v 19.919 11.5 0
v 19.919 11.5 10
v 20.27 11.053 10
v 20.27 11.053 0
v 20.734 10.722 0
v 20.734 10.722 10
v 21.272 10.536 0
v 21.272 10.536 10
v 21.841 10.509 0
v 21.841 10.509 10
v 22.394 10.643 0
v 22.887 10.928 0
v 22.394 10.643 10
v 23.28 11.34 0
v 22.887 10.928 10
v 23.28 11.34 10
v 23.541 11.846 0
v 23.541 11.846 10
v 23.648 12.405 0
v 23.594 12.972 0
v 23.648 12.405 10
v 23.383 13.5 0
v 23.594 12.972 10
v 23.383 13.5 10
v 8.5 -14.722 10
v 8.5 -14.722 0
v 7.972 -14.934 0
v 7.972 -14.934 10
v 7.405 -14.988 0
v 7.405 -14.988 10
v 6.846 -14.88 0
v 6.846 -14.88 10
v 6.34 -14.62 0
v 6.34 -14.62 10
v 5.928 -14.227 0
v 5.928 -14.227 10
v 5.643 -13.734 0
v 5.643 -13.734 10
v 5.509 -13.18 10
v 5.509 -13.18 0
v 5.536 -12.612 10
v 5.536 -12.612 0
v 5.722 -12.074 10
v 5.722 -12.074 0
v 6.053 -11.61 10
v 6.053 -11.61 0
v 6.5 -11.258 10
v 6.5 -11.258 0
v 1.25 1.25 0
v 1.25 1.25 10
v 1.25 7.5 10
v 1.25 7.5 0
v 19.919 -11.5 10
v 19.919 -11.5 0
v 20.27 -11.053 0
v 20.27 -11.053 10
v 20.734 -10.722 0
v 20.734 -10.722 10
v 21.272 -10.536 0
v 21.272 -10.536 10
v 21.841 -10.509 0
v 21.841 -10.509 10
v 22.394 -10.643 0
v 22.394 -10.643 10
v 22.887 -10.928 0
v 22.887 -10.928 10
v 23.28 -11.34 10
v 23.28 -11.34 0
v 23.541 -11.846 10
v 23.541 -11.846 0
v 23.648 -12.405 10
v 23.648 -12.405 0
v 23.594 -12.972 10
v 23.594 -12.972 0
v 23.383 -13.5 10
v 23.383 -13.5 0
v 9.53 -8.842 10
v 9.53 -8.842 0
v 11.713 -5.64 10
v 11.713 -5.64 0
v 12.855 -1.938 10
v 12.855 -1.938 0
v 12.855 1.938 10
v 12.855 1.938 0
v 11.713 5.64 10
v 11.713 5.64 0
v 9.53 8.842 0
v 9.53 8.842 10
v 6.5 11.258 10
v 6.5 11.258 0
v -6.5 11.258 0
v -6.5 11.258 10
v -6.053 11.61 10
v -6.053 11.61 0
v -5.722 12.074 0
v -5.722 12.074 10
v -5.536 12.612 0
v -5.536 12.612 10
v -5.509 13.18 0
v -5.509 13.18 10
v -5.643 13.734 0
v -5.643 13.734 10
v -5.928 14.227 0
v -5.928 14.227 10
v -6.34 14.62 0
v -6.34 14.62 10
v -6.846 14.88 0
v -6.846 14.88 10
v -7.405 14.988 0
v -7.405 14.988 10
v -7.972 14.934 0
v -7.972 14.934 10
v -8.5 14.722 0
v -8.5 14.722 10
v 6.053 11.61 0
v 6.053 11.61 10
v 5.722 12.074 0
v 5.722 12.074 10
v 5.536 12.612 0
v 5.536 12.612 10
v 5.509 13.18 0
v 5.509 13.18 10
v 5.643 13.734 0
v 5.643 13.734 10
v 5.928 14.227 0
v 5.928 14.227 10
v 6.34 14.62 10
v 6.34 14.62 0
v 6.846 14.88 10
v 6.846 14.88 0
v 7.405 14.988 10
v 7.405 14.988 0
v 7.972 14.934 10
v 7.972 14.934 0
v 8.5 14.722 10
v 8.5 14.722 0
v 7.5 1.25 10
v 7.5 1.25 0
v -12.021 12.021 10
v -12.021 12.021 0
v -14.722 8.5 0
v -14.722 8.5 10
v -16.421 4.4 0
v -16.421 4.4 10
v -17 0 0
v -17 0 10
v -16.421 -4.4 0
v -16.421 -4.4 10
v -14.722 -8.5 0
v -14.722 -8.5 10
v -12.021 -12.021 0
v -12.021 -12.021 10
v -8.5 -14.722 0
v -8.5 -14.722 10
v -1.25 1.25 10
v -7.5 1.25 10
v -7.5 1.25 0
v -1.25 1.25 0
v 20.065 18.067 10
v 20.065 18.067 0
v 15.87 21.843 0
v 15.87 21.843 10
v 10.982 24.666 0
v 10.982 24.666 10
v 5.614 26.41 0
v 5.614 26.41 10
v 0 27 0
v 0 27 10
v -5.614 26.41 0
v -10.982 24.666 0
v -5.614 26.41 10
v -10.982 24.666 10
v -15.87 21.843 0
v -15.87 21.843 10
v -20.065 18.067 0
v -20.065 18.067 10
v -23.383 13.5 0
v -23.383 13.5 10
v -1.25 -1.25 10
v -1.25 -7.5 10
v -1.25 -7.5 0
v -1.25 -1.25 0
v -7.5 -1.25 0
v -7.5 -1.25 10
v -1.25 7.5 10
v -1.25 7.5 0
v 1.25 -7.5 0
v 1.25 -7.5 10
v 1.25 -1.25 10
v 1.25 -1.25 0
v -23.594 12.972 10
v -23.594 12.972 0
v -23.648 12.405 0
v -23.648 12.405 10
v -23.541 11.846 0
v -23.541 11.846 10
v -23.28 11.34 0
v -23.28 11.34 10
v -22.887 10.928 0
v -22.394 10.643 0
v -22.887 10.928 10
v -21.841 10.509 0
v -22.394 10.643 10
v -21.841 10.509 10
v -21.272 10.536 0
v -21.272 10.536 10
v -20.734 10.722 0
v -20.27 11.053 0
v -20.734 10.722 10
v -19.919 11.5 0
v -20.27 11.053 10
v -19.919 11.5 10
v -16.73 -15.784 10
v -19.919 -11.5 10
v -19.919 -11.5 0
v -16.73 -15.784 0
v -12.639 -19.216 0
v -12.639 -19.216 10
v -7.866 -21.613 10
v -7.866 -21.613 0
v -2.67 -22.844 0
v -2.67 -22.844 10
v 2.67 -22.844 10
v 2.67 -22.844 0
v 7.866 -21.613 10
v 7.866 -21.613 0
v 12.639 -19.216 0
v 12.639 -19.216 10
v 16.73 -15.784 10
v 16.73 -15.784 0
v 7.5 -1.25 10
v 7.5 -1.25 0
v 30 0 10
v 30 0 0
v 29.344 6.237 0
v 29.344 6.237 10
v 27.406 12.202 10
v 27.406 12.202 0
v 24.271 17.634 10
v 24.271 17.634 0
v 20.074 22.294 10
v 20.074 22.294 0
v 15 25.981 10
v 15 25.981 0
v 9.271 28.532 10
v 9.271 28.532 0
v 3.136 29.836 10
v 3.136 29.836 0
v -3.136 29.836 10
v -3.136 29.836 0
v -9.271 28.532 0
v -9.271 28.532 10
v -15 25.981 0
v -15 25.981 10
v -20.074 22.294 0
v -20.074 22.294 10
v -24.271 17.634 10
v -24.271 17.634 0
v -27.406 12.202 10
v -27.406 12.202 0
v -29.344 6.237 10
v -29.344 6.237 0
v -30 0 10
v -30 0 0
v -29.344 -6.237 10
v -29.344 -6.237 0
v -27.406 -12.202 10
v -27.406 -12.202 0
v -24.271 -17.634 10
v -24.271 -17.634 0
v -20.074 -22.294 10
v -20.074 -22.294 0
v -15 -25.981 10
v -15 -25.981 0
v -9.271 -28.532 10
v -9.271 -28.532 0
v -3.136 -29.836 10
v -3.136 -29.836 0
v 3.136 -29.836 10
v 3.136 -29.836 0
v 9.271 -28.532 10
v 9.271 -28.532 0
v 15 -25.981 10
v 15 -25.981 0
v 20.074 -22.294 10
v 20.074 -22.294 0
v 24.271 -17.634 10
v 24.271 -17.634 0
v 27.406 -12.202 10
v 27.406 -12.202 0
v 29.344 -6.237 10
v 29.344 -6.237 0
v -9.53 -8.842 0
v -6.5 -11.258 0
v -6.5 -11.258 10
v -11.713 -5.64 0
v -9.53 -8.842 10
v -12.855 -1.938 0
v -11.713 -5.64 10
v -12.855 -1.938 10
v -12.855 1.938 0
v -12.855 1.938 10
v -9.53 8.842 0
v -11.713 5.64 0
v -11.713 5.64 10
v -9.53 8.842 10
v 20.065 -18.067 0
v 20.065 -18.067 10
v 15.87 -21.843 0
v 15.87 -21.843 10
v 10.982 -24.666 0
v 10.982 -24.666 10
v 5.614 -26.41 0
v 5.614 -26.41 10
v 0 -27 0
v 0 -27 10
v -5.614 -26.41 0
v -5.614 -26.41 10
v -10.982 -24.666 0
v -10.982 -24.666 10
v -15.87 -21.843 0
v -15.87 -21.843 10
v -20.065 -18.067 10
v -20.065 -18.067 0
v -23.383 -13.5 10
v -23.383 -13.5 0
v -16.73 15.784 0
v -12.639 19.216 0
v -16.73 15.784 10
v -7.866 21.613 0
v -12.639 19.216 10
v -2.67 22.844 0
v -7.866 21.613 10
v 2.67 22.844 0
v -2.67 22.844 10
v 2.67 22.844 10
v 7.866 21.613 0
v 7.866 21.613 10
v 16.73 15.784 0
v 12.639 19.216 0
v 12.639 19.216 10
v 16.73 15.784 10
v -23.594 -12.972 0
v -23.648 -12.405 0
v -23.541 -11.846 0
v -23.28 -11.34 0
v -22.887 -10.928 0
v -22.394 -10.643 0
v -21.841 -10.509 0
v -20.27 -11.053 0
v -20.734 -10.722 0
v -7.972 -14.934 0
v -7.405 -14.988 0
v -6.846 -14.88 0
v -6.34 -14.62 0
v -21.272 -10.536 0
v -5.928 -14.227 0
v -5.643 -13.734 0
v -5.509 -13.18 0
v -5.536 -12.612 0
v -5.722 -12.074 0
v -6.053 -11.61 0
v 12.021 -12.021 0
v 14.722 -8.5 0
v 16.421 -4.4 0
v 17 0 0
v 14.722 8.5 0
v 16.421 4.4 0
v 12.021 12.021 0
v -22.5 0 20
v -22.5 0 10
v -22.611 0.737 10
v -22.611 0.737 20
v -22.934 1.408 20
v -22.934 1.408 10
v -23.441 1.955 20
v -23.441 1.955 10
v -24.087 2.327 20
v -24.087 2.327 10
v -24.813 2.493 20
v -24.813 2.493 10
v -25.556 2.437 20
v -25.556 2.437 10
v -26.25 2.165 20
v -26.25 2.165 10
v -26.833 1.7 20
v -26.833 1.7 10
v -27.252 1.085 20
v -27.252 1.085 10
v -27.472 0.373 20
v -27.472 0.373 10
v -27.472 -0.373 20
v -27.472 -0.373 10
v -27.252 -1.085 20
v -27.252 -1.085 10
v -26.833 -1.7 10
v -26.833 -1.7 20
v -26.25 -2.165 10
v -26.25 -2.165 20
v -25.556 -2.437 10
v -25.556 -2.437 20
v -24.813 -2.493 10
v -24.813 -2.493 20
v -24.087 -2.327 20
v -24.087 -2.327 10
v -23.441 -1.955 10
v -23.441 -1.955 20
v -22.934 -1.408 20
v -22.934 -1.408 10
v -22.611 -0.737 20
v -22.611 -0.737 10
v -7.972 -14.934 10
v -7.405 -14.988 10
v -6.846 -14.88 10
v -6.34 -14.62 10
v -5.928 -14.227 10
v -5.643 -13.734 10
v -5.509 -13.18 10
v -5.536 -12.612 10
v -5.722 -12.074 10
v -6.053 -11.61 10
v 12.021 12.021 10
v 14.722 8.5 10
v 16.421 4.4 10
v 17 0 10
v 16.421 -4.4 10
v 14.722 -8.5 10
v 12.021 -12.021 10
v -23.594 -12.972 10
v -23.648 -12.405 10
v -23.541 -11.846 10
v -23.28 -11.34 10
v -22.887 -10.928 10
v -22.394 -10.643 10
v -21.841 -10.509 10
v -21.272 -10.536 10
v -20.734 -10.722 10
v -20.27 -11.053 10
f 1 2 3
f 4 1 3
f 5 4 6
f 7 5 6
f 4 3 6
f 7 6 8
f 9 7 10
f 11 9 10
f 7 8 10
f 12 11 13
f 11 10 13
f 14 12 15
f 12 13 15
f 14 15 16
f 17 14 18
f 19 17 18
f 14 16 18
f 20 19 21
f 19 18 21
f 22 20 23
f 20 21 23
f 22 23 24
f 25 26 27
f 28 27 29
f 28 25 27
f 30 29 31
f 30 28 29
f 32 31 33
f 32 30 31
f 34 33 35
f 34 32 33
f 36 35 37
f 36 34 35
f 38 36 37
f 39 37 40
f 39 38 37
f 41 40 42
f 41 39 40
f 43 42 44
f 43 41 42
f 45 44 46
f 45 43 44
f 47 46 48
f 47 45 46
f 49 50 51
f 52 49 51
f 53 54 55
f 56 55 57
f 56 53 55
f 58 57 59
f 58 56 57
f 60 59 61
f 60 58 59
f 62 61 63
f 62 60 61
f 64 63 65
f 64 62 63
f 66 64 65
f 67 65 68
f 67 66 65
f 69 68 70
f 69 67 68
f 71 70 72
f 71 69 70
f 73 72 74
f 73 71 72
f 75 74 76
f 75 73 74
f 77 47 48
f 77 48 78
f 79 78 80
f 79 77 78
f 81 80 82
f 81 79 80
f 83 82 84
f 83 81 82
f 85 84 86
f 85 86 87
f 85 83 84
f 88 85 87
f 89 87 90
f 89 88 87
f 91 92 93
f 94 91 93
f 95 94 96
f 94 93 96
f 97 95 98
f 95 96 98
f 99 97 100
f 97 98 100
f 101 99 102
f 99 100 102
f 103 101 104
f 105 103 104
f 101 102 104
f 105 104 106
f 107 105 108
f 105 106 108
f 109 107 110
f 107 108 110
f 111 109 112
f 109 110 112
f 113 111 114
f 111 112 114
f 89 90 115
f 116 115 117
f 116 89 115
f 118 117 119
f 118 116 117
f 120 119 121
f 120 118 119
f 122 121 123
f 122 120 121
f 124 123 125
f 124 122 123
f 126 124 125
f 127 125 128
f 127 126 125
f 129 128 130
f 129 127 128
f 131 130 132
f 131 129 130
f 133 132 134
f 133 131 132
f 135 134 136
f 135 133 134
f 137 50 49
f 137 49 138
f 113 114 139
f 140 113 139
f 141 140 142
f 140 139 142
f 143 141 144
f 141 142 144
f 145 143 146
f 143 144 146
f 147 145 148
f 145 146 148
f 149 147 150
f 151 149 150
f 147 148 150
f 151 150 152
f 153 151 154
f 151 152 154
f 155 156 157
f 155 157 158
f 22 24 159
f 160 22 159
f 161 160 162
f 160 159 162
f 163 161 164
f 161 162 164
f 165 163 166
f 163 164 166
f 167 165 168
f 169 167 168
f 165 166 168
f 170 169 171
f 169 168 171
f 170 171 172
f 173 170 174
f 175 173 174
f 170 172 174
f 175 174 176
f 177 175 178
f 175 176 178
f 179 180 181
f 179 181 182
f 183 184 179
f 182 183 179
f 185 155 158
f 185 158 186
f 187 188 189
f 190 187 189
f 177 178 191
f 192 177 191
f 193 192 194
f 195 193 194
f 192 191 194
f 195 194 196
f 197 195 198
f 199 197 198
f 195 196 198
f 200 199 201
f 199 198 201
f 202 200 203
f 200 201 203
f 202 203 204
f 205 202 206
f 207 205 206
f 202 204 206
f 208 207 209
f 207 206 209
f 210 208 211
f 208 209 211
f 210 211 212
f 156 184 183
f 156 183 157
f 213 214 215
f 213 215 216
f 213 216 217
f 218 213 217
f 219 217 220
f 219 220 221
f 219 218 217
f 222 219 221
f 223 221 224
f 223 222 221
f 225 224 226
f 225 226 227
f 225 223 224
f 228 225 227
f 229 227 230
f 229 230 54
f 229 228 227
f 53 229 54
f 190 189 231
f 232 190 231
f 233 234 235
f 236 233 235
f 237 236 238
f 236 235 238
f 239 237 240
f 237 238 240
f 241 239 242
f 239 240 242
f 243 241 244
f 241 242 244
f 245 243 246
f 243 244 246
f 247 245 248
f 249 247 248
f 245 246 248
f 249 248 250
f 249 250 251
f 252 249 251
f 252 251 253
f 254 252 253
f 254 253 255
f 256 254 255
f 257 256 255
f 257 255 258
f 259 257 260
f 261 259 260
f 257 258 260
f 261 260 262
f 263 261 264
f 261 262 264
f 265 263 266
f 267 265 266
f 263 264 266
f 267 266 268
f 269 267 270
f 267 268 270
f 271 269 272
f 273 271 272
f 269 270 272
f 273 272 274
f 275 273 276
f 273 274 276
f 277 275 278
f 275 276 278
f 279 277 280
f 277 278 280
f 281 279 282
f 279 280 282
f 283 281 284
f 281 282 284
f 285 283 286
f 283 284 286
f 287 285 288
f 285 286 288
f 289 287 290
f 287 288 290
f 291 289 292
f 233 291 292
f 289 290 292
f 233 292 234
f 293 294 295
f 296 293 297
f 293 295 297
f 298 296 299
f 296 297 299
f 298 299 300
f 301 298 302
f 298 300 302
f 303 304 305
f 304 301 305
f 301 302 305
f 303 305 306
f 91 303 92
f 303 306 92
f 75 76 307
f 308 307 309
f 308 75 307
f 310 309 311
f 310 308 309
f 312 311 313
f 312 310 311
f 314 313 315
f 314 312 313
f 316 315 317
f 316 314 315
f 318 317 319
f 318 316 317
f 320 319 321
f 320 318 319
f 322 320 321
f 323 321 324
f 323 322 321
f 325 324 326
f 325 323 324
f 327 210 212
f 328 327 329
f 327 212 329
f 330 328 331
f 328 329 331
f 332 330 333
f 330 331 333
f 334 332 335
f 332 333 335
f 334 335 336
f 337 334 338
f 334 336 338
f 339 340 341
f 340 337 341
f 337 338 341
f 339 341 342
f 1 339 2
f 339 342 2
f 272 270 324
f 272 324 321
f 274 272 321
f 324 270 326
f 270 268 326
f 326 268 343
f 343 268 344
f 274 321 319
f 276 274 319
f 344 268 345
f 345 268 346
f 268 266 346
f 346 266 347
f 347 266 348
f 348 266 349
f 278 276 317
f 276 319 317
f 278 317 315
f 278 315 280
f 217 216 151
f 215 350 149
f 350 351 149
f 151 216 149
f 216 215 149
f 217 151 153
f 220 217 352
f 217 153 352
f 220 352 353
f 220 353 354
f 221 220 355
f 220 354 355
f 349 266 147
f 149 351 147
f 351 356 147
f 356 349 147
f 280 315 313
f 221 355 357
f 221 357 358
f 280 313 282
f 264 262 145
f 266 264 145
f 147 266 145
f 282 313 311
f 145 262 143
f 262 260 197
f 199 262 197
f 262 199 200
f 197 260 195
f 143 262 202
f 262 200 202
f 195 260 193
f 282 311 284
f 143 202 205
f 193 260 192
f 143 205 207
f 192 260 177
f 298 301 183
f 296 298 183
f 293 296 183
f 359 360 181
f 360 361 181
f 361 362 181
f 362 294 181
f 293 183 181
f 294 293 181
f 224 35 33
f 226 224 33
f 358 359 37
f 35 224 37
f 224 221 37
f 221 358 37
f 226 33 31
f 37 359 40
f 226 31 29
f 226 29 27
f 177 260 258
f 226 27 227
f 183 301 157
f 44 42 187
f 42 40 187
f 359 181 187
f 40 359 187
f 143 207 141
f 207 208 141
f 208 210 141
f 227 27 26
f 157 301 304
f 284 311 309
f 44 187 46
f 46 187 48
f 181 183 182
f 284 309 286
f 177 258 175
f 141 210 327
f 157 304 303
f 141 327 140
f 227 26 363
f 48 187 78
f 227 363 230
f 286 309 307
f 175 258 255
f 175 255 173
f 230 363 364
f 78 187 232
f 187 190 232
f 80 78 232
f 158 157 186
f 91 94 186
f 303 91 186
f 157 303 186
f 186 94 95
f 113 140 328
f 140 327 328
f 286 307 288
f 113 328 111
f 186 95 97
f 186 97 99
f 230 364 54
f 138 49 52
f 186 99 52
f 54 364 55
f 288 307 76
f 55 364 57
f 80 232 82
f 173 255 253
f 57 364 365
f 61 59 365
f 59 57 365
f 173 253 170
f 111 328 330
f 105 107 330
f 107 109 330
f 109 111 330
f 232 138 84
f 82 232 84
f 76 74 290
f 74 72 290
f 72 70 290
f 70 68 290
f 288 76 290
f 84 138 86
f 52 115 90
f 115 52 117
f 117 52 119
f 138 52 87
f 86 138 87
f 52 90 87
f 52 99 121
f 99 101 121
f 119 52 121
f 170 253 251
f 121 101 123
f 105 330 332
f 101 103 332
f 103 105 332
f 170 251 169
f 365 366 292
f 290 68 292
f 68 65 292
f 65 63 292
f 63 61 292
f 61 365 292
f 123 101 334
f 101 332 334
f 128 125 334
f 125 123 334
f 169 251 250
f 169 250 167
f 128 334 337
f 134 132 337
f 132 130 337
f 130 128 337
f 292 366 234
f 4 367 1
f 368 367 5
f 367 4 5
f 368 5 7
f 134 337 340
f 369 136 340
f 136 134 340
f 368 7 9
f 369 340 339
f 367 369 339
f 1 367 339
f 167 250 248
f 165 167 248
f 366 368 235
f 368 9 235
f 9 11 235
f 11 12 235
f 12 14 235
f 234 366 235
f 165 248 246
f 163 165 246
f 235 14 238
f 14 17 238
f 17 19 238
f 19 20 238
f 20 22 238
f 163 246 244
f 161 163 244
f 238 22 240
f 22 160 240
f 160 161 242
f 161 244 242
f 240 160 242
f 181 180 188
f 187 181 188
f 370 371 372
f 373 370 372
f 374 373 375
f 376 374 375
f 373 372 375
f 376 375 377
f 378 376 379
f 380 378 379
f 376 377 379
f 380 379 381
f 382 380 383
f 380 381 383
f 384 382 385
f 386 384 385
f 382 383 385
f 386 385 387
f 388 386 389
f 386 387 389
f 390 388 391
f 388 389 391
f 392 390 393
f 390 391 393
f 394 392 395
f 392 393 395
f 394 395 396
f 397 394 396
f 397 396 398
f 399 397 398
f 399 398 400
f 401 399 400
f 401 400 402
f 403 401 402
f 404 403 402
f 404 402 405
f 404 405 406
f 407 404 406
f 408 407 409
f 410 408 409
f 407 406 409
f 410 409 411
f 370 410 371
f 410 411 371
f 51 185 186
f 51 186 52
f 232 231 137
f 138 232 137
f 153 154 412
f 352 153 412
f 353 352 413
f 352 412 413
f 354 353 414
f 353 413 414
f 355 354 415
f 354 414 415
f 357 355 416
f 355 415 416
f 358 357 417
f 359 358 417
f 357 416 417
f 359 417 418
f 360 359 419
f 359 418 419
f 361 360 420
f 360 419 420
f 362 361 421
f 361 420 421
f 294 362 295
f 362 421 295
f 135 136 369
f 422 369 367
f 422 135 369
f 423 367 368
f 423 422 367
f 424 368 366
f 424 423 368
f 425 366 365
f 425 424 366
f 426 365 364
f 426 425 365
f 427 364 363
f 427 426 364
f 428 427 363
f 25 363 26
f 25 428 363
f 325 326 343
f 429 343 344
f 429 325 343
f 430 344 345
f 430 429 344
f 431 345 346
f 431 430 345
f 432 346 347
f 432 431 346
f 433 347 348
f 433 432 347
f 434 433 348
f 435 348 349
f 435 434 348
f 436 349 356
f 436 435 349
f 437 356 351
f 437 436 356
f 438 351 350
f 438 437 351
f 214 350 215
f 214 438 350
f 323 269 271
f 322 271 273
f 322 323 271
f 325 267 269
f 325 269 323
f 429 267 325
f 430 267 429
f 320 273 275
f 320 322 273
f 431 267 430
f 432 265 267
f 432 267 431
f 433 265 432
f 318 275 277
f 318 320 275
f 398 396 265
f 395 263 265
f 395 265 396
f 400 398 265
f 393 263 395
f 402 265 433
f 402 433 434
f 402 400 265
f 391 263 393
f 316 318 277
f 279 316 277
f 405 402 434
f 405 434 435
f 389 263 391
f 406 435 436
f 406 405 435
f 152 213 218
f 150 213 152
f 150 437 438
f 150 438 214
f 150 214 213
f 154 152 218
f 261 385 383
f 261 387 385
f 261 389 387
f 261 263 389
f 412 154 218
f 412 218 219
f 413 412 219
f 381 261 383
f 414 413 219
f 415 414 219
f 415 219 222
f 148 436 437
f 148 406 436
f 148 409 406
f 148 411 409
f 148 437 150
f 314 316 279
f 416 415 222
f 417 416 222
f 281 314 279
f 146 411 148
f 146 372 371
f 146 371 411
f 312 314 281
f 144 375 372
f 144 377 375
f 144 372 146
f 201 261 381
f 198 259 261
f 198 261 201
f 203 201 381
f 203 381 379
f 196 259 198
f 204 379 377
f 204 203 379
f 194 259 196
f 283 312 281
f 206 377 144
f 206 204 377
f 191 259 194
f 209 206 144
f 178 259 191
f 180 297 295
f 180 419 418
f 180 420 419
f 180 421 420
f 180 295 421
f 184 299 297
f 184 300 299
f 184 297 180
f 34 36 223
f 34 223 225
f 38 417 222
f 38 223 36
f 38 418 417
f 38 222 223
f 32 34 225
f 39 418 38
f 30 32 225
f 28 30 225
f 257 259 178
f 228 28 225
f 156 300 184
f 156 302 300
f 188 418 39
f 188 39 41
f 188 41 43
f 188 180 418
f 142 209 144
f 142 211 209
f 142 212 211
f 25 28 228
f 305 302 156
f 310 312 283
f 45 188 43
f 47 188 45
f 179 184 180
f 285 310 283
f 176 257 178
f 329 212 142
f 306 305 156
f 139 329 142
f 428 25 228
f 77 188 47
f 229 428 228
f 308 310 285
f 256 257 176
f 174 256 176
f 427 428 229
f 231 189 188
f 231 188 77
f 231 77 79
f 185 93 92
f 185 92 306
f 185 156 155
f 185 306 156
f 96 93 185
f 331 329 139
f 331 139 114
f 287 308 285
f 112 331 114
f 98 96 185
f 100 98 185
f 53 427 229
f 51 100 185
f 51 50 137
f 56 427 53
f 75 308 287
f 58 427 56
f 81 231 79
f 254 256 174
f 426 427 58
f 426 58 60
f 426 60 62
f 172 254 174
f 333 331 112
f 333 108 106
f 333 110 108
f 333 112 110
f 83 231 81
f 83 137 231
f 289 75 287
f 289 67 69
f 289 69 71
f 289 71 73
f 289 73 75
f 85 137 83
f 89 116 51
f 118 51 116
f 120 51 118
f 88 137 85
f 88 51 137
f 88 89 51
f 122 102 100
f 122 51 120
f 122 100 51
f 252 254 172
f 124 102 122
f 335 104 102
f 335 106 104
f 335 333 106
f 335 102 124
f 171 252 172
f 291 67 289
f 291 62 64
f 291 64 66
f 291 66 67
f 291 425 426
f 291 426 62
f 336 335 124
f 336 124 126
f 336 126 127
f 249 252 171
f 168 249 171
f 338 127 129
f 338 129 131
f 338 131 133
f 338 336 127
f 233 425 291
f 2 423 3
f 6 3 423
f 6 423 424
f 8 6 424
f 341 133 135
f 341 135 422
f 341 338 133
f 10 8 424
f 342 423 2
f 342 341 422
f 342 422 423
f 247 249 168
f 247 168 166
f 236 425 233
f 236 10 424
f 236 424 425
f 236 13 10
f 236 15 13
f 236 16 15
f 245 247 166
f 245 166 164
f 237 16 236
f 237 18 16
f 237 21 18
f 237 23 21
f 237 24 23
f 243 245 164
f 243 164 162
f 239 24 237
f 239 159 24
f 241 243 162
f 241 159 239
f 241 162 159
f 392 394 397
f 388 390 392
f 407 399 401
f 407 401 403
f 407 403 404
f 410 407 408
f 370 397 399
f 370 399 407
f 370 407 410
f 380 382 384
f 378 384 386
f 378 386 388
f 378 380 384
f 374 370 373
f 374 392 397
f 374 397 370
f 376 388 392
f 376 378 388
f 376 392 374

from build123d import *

# Parameters (mm, degrees)
SKETCH_1_R          = 30
EXTRUDE_1_DEPTH     = 10
SKETCH_2_R          = 2.5
EXTRUDE_3_DEPTH     = 10
SKETCH_5_W          = 2.5
SKETCH_5_H          = 6.25
SKETCH_5_W_2        = 6.25
SKETCH_5_H_2        = 2.5
CUT_EXTRUDE_3_DEPTH = 10
CUT_EXTRUDE_4_DEPTH = 20


with BuildPart() as part:
    # 草图1 → 凸台-拉伸1 (new body)
    with BuildSketch(Plane.XY):
        Circle(SKETCH_1_R)
    extrude(amount=EXTRUDE_1_DEPTH)

    # 草图2 → 凸台-拉伸3 (add)
    with BuildSketch(Plane.XY.offset(10)):
        with Locations((-25, 0)):
            Circle(SKETCH_2_R)
    extrude(amount=EXTRUDE_3_DEPTH)

    # 草图5 → 切除-拉伸3 (cut)
    with BuildSketch(Plane.XY.offset(10)):
        with Locations((0, 4.375)):
            Rectangle(SKETCH_5_W, SKETCH_5_H)
        with Locations((-4.375, 0)):
            Rectangle(SKETCH_5_W_2, SKETCH_5_H_2)
        with Locations((4.375, 0)):
            Rectangle(SKETCH_5_W_2, SKETCH_5_H_2)
        with Locations((0, -4.375)):
            Rectangle(SKETCH_5_W, SKETCH_5_H)
        Rectangle(SKETCH_5_W, SKETCH_5_H_2)
    extrude(amount=-CUT_EXTRUDE_3_DEPTH, mode=Mode.SUBTRACT)

    # 草图7 → 切除-拉伸4 (cut)
    with BuildSketch(Plane.XY.offset(10)):
        with BuildLine():
            ThreePointArc((23.382685902, 13.5), (0, 27), (-23.382685902, 13.5))
            ThreePointArc((-23.382685902, 13.5), (-22.650635095, 10.767949192), (-19.918584287, 11.5))
            ThreePointArc((-19.918584287, 11.5), (0, 23), (19.918584287, 11.5))
            ThreePointArc((19.918584287, 11.5), (22.650635095, 10.767949192), (23.382685902, 13.5))
        make_face()
        with BuildLine():
            ThreePointArc((23.382685902, -13.5), (0, -27), (-23.382685902, -13.5))
            ThreePointArc((-23.382685902, -13.5), (-22.650635095, -10.767949192), (-19.918584287, -11.5))
            ThreePointArc((-19.918584287, -11.5), (0, -23), (19.918584287, -11.5))
            ThreePointArc((19.918584287, -11.5), (22.650635095, -10.767949192), (23.382685902, -13.5))
        make_face()
        with BuildLine():
            ThreePointArc((-8.5, 14.722431864), (-17, 0), (-8.5, -14.722431864))
            ThreePointArc((-8.5, -14.722431864), (-5.767949192, -13.990381057), (-6.5, -11.258330249))
            ThreePointArc((-6.5, -11.258330249), (-13, 0), (-6.5, 11.258330249))
            ThreePointArc((-6.5, 11.258330249), (-5.767949192, 13.990381057), (-8.5, 14.722431864))
        make_face()
        with BuildLine():
            ThreePointArc((8.5, 14.722431864), (17, 0), (8.5, -14.722431864))
            ThreePointArc((8.5, -14.722431864), (5.767949192, -13.990381057), (6.5, -11.258330249))
            ThreePointArc((6.5, -11.258330249), (13, 0), (6.5, 11.258330249))
            ThreePointArc((6.5, 11.258330249), (5.767949192, 13.990381057), (8.5, 14.722431864))
        make_face()
    extrude(amount=-CUT_EXTRUDE_4_DEPTH, mode=Mode.SUBTRACT)


solid = part.part
